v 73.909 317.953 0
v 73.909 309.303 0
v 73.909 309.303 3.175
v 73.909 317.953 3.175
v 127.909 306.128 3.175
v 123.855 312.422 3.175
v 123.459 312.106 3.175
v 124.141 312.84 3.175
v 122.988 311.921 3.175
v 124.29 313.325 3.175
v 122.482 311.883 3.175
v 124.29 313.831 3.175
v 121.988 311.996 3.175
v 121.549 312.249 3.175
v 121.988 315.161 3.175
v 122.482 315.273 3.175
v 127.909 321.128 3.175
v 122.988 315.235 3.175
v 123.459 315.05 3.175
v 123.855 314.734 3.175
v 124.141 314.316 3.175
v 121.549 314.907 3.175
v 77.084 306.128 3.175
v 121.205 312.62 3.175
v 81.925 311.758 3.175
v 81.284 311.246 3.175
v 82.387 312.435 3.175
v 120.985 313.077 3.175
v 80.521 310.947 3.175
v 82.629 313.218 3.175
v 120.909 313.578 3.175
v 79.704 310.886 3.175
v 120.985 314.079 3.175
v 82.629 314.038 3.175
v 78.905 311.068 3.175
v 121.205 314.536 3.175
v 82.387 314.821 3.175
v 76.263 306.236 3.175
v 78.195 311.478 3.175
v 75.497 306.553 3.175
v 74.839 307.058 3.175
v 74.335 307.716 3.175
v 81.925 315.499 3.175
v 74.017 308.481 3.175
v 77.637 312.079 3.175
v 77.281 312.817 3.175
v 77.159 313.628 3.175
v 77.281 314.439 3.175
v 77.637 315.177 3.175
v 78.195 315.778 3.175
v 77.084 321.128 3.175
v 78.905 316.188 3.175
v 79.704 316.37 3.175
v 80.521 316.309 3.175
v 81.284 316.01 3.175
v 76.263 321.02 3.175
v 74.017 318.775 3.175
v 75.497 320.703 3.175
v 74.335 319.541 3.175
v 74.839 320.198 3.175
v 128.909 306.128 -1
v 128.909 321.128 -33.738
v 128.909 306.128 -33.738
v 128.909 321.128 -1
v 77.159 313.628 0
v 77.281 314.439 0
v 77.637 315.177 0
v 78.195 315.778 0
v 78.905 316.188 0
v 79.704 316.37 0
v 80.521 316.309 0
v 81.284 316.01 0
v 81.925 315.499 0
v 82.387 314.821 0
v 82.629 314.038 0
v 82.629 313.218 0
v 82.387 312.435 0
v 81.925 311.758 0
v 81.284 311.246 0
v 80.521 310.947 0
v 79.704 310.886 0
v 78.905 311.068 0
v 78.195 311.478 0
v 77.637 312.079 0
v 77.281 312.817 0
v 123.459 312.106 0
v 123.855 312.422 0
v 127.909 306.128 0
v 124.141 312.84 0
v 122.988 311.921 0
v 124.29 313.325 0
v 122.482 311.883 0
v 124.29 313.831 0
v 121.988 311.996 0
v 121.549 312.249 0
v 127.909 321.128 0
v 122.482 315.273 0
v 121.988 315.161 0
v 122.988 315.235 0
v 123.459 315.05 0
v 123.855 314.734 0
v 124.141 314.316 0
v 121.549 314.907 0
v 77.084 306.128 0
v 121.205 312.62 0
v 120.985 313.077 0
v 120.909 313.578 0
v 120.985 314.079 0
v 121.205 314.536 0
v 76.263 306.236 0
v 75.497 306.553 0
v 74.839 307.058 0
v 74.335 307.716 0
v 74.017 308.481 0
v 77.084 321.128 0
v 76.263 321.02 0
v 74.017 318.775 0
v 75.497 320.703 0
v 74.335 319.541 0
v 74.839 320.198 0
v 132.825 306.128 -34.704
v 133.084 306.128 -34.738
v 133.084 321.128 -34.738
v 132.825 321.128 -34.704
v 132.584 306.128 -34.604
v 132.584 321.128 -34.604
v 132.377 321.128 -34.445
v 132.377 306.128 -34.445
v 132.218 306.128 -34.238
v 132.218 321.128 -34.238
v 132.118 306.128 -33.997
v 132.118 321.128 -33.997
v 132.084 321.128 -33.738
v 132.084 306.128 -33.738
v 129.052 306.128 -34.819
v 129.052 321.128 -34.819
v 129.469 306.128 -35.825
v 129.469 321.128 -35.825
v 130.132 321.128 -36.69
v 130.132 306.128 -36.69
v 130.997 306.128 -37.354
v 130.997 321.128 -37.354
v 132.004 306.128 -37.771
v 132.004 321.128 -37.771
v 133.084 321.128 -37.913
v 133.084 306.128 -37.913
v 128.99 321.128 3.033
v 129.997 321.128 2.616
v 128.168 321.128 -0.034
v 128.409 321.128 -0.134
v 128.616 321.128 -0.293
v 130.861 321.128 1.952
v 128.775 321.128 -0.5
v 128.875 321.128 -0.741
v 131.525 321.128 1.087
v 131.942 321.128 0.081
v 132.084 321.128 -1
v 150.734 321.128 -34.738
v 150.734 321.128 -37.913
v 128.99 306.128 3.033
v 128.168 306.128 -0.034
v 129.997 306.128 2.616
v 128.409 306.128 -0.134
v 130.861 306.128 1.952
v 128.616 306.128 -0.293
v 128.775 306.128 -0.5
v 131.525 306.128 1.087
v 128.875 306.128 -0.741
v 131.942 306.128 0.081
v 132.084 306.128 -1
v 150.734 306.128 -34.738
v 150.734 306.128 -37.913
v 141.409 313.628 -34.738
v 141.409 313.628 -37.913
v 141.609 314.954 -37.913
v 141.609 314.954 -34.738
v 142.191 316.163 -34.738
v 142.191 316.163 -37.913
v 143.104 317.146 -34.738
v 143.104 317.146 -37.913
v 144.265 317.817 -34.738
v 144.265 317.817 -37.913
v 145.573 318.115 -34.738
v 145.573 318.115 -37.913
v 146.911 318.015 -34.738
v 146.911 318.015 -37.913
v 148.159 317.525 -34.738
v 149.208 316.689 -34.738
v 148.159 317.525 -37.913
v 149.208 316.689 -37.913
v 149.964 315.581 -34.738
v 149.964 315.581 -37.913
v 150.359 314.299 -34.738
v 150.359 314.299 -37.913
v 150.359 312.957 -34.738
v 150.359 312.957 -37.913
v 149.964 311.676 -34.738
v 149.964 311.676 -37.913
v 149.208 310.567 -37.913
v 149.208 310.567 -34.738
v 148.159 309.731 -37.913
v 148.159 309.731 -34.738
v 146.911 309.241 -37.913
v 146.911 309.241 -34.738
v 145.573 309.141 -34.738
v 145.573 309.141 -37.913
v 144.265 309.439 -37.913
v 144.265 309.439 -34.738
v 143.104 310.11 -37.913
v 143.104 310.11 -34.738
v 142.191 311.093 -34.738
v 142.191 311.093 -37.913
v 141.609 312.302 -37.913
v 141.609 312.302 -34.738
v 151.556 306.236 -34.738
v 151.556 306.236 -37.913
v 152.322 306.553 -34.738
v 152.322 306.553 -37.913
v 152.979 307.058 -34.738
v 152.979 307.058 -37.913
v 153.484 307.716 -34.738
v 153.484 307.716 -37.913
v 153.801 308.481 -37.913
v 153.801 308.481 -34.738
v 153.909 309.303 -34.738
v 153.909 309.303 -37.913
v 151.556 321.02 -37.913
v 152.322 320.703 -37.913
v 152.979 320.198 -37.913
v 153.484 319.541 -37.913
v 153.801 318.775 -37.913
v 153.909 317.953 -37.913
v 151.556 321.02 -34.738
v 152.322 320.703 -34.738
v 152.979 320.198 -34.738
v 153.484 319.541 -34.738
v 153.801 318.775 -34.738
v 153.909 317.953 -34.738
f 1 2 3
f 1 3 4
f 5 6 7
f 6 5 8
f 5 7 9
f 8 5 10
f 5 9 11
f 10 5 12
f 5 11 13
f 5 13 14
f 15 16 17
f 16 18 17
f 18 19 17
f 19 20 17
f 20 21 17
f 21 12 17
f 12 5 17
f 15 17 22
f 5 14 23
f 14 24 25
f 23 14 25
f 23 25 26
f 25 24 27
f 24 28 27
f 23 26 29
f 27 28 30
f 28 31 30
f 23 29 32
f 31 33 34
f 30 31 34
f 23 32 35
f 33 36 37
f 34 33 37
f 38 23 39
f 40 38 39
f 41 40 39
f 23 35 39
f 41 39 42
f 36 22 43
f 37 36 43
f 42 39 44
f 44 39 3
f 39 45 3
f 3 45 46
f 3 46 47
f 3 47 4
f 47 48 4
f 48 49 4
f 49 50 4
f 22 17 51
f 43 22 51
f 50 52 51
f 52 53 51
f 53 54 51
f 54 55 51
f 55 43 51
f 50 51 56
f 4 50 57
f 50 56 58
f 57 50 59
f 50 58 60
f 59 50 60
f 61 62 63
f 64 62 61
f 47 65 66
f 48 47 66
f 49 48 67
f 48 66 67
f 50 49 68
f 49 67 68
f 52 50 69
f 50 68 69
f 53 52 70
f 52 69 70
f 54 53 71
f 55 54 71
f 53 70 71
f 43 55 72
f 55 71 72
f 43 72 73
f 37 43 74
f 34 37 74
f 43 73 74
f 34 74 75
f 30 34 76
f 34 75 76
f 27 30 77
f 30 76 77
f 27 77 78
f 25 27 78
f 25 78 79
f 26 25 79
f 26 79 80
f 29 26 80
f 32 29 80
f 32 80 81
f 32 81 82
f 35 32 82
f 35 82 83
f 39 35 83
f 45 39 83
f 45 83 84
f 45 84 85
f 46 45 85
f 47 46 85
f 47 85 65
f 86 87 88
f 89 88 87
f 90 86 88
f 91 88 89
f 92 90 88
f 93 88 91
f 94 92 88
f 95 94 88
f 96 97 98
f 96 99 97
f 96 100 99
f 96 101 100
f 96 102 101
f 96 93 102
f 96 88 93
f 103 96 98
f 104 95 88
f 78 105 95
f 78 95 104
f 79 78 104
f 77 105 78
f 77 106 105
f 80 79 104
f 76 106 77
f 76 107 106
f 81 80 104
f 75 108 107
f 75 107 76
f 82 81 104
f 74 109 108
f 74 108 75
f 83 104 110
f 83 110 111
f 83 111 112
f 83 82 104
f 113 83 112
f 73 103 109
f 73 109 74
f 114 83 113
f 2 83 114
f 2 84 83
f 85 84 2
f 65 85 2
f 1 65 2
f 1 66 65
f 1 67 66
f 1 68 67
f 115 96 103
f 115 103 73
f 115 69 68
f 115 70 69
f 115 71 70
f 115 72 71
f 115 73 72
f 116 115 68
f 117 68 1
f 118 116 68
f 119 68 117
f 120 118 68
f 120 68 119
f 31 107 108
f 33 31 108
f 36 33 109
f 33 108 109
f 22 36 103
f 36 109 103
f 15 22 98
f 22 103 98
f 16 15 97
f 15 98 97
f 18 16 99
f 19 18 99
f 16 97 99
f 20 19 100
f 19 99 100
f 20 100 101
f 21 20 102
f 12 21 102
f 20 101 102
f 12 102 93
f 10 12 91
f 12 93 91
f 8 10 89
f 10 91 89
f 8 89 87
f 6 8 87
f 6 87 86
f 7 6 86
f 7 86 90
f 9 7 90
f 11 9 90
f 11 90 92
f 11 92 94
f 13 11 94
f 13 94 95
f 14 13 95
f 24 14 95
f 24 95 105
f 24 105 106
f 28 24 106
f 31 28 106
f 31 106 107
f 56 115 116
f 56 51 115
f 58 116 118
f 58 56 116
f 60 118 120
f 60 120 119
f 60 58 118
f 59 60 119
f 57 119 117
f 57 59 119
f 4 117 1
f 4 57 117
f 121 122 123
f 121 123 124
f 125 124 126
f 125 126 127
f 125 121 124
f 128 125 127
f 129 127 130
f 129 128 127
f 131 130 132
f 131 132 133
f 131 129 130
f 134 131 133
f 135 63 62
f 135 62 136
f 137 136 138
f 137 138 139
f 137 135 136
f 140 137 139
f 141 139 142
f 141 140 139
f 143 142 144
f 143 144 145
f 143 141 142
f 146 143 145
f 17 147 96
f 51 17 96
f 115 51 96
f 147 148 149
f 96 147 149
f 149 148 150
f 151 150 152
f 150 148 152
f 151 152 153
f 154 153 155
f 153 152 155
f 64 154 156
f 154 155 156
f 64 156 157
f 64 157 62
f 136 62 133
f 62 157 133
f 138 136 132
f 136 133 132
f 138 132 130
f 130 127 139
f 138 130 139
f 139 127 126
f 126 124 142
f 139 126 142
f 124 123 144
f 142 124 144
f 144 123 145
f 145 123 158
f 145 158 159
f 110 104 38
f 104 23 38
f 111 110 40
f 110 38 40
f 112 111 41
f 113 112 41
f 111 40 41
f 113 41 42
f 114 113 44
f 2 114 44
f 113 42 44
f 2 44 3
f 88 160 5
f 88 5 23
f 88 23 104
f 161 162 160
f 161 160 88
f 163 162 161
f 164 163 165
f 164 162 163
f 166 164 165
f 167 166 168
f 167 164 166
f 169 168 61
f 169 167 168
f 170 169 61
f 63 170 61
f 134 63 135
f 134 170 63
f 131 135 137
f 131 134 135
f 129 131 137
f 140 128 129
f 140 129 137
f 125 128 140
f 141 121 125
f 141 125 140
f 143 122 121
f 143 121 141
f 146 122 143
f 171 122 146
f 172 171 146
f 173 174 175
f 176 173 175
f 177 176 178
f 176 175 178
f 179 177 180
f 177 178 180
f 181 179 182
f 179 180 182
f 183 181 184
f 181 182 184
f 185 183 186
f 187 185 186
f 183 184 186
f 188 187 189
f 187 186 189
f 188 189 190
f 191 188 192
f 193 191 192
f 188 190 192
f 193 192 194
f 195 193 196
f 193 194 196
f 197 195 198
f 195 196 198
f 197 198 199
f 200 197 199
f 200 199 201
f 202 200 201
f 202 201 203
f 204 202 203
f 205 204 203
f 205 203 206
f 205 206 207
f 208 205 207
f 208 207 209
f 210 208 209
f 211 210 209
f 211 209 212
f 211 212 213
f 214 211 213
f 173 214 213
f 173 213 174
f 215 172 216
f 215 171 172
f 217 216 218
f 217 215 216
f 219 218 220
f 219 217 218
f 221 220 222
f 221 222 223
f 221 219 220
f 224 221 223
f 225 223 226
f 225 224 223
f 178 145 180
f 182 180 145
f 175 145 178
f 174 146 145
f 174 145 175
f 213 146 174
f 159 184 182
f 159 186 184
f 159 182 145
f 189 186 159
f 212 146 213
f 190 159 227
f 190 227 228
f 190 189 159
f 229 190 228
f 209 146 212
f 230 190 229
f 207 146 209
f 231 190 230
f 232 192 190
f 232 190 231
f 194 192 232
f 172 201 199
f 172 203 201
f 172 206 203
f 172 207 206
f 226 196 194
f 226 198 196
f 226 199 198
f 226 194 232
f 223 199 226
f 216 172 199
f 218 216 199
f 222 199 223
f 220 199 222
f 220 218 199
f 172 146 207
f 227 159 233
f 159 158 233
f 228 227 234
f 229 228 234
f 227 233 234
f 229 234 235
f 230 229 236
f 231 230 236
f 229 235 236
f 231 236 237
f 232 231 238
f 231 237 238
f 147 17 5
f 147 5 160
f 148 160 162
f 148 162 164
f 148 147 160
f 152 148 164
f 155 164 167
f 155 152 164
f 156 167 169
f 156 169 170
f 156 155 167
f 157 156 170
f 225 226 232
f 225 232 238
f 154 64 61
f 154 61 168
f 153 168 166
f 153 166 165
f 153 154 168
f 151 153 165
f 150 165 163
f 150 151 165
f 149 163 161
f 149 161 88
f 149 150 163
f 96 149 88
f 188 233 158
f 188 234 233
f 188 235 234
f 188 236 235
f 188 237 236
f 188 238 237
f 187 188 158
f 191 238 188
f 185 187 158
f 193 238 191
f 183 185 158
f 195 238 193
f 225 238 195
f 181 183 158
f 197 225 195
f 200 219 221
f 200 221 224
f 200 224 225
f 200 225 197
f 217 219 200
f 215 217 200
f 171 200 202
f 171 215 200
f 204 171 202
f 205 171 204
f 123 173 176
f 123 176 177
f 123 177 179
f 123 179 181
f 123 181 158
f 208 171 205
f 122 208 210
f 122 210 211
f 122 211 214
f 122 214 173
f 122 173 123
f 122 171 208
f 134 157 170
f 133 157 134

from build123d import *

# Parameters (mm, degrees)
BASE_FLANGE1_DEPTH   = 3.175
EDGE_FLANGE1_DEPTH   = 15
EDGE_FLANGE2_DEPTH   = 15
M5_CLEARANCE_HOLE1_D = 5.5
M8_CLEARANCE_HOLE1_D = 9
FILLET1_R            = 3.175
M3_CLEARANCE_HOLE1_D = 3.4


# Sheet-metal steps are written as plain solids
with BuildPart() as part:
    # Sketch2 → Base-Flange1 (new body)
    with BuildSketch(Plane.XY):
        Polygon((79.909284585, 306.128054742), (73.909284585, 306.128054742), (73.909284585, 321.128054742), (79.909284585, 321.128054742), (127.909284585, 321.128054742), (127.909284585, 306.128054742), align=None)
    extrude(amount=BASE_FLANGE1_DEPTH)

    # Edge-Flange1 section (across the edge) → Edge-Flange1 (add)
    with BuildSketch(Plane(origin=(128.909284585, 321.128054742, 0), x_dir=(-1, 0, 0), z_dir=(0, -1, 0))):
        with BuildLine():
            Line((-3.175, 1), (-3.175, 33.738))
            Line((-3.175, 33.738), (0, 33.738))
            Line((0, 33.738), (0, 1))
            ThreePointArc((0, 1), (0.292893219, 0.292893219), (1, 0))
            Line((1, 0), (1, -3.175))
            ThreePointArc((1, -3.175), (-1.952170811, -1.952170811), (-3.175, 1))
        make_face()
    extrude(amount=EDGE_FLANGE1_DEPTH)

    # Edge-Flange2 section (across the edge) → Edge-Flange2 (add)
    with BuildSketch(Plane(origin=(132.084284585, 306.128054742, -34.738), x_dir=(0, 0, 1), z_dir=(0, 1, 0))):
        with BuildLine():
            Line((-3.175, 1), (-3.175, 21.825))
            Line((-3.175, 21.825), (0, 21.825))
            Line((0, 21.825), (0, 1))
            ThreePointArc((0, 1), (0.292893219, 0.292893219), (1, 0))
            Line((1, 0), (1, -3.175))
            ThreePointArc((1, -3.175), (-1.952170811, -1.952170811), (-3.175, 1))
        make_face()
    extrude(amount=EDGE_FLANGE2_DEPTH)

    # M5 Clearance Hole1 (through all)
    with Locations(Plane.XY.offset(3.175)):
        with Locations((79.909284585, 313.628054742)):
            Hole(M5_CLEARANCE_HOLE1_D / 2)

    # M8 Clearance Hole1 (through all)
    with Locations(Plane.XY.offset(-34.738)):
        with Locations((145.909284585, 313.628054742)):
            Hole(M8_CLEARANCE_HOLE1_D / 2)

    # Fillet1
    fillet1_edges = [part.edges().sort_by_distance(p)[0] for p in [
        (73.909284585, 306.128054742, 1.5875),
        (73.909284585, 321.128054742, 1.5875),
        (153.909284585, 306.128054742, -36.3255),
        (153.909284585, 321.128054742, -36.3255),
    ]]
    fillet(fillet1_edges, radius=FILLET1_R)

    # M3 Clearance Hole1 (through all)
    with Locations(Plane.XY.offset(3.175)):
        with Locations((122.609284585, 313.578054742)):
            Hole(M3_CLEARANCE_HOLE1_D / 2)


solid = part.part
